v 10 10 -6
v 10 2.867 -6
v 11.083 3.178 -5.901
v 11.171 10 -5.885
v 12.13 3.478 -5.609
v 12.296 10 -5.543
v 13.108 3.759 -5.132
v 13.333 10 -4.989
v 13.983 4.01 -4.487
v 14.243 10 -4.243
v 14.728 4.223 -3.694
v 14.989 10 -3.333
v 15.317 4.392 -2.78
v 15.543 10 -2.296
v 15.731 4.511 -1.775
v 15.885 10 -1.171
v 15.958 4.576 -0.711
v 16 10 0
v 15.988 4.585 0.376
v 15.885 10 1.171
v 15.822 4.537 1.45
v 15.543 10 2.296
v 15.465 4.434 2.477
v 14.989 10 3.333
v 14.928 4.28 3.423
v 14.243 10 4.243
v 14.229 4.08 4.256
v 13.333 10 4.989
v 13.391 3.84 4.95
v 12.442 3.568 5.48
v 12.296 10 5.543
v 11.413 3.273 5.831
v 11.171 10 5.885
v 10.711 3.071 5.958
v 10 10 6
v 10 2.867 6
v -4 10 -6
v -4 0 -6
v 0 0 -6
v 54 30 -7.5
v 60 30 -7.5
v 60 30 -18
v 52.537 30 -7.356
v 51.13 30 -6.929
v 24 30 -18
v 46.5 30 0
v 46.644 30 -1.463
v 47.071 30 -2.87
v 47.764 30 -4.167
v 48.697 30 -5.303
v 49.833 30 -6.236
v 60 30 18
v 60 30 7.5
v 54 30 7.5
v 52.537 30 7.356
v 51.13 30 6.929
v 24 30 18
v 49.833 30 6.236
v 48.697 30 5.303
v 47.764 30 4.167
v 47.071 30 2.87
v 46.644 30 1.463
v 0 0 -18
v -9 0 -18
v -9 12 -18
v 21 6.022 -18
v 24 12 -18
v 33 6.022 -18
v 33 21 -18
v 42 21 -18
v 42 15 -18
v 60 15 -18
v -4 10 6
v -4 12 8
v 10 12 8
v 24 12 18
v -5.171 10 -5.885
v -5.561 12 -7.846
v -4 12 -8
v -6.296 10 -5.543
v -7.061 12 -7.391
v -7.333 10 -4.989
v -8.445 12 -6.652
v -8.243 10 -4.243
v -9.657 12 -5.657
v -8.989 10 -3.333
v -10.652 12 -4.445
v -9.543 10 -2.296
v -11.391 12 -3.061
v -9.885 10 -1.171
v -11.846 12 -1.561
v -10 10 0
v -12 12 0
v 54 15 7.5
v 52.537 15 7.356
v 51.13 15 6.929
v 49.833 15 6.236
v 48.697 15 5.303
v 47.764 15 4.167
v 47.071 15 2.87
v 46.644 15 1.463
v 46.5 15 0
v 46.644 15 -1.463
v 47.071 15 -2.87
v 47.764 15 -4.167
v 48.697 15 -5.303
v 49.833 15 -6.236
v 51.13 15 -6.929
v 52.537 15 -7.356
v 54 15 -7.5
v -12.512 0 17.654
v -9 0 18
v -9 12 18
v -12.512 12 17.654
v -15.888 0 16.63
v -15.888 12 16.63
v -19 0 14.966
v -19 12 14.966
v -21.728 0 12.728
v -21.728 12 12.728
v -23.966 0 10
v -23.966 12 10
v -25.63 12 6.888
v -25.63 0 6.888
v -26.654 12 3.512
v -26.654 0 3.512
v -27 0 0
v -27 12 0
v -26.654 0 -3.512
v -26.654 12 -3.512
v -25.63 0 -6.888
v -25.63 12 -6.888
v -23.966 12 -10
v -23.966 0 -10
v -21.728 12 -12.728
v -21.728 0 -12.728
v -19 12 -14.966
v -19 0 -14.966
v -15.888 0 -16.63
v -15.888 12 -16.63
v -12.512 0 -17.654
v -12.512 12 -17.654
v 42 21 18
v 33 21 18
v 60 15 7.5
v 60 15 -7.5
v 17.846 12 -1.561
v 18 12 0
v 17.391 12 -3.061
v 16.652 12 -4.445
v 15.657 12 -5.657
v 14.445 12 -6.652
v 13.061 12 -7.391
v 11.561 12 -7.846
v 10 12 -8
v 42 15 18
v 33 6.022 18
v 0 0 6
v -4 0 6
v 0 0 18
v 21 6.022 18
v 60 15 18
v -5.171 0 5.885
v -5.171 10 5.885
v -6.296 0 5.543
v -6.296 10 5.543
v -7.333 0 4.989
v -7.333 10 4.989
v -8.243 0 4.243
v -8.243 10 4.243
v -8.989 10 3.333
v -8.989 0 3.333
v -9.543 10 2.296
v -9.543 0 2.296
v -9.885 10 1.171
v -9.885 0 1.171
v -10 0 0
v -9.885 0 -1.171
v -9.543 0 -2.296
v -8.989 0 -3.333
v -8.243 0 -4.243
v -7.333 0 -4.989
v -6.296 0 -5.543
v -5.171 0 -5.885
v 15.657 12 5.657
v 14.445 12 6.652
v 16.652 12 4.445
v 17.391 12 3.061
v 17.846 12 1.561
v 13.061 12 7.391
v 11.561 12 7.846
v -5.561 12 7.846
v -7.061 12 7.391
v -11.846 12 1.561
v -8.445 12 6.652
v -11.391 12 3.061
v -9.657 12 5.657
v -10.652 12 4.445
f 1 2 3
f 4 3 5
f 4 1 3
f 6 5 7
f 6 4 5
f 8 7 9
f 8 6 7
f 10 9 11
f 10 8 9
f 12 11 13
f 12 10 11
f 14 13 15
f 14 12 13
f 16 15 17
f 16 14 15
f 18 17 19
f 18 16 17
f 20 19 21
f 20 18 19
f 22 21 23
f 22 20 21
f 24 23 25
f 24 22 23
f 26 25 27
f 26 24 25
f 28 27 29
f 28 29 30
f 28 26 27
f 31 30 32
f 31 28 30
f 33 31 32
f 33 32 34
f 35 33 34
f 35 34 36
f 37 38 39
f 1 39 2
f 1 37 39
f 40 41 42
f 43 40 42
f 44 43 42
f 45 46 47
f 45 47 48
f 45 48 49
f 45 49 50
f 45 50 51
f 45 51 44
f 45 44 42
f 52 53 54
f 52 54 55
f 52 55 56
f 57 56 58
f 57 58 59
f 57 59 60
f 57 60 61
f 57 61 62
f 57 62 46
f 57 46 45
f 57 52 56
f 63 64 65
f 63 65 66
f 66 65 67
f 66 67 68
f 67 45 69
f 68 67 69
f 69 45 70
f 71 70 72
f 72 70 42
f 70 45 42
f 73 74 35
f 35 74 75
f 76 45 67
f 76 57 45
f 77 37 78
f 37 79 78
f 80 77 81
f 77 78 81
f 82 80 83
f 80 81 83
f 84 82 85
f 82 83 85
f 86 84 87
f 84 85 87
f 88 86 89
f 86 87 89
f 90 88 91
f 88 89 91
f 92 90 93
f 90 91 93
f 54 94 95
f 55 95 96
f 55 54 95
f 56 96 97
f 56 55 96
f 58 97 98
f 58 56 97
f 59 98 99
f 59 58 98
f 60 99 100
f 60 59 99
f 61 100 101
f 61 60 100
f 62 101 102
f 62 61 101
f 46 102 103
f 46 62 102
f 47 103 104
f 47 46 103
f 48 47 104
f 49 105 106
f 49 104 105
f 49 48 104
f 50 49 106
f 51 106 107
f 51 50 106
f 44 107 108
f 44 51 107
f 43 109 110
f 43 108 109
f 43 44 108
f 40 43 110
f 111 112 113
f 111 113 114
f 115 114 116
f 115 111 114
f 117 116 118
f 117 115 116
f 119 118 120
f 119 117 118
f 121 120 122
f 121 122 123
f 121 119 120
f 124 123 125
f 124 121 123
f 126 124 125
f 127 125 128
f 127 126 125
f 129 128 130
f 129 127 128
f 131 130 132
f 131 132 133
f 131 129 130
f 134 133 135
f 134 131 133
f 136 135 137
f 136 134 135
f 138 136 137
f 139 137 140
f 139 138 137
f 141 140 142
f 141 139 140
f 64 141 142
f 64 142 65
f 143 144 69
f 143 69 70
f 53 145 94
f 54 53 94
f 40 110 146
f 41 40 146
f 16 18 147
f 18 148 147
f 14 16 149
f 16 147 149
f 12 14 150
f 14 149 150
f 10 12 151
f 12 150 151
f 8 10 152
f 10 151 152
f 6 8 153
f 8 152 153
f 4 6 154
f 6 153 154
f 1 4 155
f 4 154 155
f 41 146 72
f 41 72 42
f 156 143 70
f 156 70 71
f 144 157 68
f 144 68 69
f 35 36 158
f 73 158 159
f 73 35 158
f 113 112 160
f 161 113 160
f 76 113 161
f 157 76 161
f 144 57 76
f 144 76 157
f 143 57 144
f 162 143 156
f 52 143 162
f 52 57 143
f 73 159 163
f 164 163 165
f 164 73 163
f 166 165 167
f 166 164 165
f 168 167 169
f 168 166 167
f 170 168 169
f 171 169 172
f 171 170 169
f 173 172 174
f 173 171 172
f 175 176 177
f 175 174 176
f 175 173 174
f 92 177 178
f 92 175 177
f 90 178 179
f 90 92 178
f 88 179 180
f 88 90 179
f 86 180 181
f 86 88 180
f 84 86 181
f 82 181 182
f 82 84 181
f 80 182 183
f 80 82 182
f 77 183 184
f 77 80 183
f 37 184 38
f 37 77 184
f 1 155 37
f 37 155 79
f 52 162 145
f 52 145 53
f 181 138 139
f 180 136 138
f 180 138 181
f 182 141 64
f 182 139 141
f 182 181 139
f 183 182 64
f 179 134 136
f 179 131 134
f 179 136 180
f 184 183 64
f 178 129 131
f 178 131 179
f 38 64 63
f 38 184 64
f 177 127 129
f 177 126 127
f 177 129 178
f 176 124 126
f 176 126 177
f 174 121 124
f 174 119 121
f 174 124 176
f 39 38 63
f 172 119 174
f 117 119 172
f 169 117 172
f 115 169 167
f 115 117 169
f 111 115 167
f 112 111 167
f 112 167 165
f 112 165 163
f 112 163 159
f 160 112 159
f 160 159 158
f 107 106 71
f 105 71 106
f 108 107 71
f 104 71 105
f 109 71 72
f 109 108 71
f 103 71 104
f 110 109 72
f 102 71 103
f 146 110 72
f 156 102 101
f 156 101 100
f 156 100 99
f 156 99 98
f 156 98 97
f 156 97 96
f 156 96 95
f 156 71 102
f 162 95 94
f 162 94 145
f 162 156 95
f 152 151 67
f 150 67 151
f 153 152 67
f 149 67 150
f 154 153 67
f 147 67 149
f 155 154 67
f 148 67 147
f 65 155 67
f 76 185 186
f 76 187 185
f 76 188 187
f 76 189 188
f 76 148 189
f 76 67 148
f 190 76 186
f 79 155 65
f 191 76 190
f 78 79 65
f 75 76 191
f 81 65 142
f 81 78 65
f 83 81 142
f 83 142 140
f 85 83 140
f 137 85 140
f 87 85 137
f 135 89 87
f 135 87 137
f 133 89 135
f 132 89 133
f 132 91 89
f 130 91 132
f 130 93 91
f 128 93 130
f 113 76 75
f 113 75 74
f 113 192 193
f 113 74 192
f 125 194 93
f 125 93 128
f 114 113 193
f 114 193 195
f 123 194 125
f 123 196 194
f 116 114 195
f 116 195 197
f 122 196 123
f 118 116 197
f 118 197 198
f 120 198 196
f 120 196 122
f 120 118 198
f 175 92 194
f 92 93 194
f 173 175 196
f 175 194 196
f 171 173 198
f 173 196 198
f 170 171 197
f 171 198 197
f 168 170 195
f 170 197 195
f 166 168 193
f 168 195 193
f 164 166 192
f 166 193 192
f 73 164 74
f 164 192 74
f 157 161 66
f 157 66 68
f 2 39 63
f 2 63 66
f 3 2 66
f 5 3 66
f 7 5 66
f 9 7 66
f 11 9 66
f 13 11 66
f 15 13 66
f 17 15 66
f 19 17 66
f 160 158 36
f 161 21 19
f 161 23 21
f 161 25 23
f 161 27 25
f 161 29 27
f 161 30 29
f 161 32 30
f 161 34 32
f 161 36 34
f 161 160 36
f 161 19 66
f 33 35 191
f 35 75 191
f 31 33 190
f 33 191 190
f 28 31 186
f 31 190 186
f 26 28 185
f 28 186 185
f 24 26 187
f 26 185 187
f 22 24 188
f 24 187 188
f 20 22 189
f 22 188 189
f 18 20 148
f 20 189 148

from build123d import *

# Parameters (mm, degrees)
BOSS_EXTRUDE1_DEPTH = 18
FILLET1_RADIUS      = 18
FILLET1_LENGTH      = 12
CUT_EXTRUDE1_DEPTH  = 36
CUT_EXTRUDE2_DEPTH  = 36


with BuildPart() as part:
    # Sketch1 → Boss-Extrude1 (new, symmetric)
    with BuildSketch(Plane.XY):
        Polygon((-27, 12), (-27, 0), (0, 0), (21, 6.021653101), (33, 6.021653101), (33, 21), (42, 21), (42, 15), (60, 15), (60, 30), (24, 30), (24, 12), align=None)
    extrude(amount=BOSS_EXTRUDE1_DEPTH, both=True)

    # Fillet1: full round fillet: the end face becomes a half cylinder, R = half its width
    fillet1_face = Plane((-27, 6, 0), x_dir=(0, -1, 0), z_dir=(-1, 0, 0))  # on the end face: x along it, z out of the body
    fillet1_slab = fillet1_face.offset(-FILLET1_RADIUS / 2) * Box(FILLET1_LENGTH, 2 * FILLET1_RADIUS, FILLET1_RADIUS, mode=Mode.PRIVATE)  # the body's end, R deep
    fillet1_round = Plane((-9, 6, 0), x_dir=(-1, 0, 0), z_dir=(0, -1, 0)) * Cylinder(FILLET1_RADIUS, FILLET1_LENGTH, mode=Mode.PRIVATE)  # its axis R under the face
    add(fillet1_slab - fillet1_round, mode=Mode.SUBTRACT)

    # Sketch3 → Cut-Extrude1 (cut)
    with BuildSketch(Plane(origin=(0, 12, 0), x_dir=(1, 0, 0), z_dir=(0, 1, 0))):
        with BuildLine():
            Line((10, -6), (-4, -6))
            ThreePointArc((-4, -6), (-10, 0), (-4, 6))
            Line((-4, 6), (10, 6))
            ThreePointArc((10, 6), (16, 0), (10, -6))
        make_face()
    extrude(amount=-CUT_EXTRUDE1_DEPTH, mode=Mode.SUBTRACT)

    # Chamfer1: read off the stored shape, not the designer's step
    # Chamfer1: loft between two sections, ruled curve by curve
    chamfer1_from = [
        Edge.make_three_point_arc((10, 10, 6), (14.242640687, 10, 4.242640687), (16, 10, 0)),
        Edge.make_three_point_arc((16, 10, 0), (14.242640687, 10, -4.242640687), (10, 10, -6)),
        Edge.make_three_point_arc((-4, 10, -6), (-8.242640687, 10, -4.242640687), (-10, 10, 0)),
        Edge.make_three_point_arc((-10, 10, 0), (-8.242640687, 10, 4.242640687), (-4, 10, 6)),
        Edge.make_line((-4, 10, 6), (10, 10, 6)),
        Edge.make_line((10, 10, -6), (-4, 10, -6)),
    ]
    chamfer1_to = [
        Edge.make_three_point_arc((10, 12, 8), (15.656854249, 12, 5.656854249), (18, 12, 0)),
        Edge.make_three_point_arc((18, 12, 0), (15.656854249, 12, -5.656854249), (10, 12, -8)),
        Edge.make_three_point_arc((-4, 12, -8), (-9.656854249, 12, -5.656854249), (-12, 12, 0)),
        Edge.make_three_point_arc((-12, 12, 0), (-9.656854249, 12, 5.656854249), (-4, 12, 8)),
        Edge.make_line((-4, 12, 8), (10, 12, 8)),
        Edge.make_line((10, 12, -8), (-4, 12, -8)),
    ]
    chamfer1 = Solid(Shell([*[Face.make_surface_from_curves(chamfer1_from[k], chamfer1_to[k]) for k in range(6)], Face(Wire(chamfer1_from)), Face(Wire(chamfer1_to))]))
    add(chamfer1, mode=Mode.SUBTRACT)

    # Sketch4 → Cut-Extrude2 (cut)
    with BuildSketch(Plane(origin=(0, 30, 0), x_dir=(1, 0, 0), z_dir=(0, 1, 0))):
        with BuildLine():
            Line((54, 7.5), (65.591333802, 7.5))
            ThreePointArc((65.591333802, 7.5), (73.091333802, 0), (65.591333802, -7.5))
            Line((65.591333802, -7.5), (54, -7.5))
            ThreePointArc((54, -7.5), (46.5, 0), (54, 7.5))
        make_face()
    extrude(amount=-CUT_EXTRUDE2_DEPTH, mode=Mode.SUBTRACT)


solid = part.part
